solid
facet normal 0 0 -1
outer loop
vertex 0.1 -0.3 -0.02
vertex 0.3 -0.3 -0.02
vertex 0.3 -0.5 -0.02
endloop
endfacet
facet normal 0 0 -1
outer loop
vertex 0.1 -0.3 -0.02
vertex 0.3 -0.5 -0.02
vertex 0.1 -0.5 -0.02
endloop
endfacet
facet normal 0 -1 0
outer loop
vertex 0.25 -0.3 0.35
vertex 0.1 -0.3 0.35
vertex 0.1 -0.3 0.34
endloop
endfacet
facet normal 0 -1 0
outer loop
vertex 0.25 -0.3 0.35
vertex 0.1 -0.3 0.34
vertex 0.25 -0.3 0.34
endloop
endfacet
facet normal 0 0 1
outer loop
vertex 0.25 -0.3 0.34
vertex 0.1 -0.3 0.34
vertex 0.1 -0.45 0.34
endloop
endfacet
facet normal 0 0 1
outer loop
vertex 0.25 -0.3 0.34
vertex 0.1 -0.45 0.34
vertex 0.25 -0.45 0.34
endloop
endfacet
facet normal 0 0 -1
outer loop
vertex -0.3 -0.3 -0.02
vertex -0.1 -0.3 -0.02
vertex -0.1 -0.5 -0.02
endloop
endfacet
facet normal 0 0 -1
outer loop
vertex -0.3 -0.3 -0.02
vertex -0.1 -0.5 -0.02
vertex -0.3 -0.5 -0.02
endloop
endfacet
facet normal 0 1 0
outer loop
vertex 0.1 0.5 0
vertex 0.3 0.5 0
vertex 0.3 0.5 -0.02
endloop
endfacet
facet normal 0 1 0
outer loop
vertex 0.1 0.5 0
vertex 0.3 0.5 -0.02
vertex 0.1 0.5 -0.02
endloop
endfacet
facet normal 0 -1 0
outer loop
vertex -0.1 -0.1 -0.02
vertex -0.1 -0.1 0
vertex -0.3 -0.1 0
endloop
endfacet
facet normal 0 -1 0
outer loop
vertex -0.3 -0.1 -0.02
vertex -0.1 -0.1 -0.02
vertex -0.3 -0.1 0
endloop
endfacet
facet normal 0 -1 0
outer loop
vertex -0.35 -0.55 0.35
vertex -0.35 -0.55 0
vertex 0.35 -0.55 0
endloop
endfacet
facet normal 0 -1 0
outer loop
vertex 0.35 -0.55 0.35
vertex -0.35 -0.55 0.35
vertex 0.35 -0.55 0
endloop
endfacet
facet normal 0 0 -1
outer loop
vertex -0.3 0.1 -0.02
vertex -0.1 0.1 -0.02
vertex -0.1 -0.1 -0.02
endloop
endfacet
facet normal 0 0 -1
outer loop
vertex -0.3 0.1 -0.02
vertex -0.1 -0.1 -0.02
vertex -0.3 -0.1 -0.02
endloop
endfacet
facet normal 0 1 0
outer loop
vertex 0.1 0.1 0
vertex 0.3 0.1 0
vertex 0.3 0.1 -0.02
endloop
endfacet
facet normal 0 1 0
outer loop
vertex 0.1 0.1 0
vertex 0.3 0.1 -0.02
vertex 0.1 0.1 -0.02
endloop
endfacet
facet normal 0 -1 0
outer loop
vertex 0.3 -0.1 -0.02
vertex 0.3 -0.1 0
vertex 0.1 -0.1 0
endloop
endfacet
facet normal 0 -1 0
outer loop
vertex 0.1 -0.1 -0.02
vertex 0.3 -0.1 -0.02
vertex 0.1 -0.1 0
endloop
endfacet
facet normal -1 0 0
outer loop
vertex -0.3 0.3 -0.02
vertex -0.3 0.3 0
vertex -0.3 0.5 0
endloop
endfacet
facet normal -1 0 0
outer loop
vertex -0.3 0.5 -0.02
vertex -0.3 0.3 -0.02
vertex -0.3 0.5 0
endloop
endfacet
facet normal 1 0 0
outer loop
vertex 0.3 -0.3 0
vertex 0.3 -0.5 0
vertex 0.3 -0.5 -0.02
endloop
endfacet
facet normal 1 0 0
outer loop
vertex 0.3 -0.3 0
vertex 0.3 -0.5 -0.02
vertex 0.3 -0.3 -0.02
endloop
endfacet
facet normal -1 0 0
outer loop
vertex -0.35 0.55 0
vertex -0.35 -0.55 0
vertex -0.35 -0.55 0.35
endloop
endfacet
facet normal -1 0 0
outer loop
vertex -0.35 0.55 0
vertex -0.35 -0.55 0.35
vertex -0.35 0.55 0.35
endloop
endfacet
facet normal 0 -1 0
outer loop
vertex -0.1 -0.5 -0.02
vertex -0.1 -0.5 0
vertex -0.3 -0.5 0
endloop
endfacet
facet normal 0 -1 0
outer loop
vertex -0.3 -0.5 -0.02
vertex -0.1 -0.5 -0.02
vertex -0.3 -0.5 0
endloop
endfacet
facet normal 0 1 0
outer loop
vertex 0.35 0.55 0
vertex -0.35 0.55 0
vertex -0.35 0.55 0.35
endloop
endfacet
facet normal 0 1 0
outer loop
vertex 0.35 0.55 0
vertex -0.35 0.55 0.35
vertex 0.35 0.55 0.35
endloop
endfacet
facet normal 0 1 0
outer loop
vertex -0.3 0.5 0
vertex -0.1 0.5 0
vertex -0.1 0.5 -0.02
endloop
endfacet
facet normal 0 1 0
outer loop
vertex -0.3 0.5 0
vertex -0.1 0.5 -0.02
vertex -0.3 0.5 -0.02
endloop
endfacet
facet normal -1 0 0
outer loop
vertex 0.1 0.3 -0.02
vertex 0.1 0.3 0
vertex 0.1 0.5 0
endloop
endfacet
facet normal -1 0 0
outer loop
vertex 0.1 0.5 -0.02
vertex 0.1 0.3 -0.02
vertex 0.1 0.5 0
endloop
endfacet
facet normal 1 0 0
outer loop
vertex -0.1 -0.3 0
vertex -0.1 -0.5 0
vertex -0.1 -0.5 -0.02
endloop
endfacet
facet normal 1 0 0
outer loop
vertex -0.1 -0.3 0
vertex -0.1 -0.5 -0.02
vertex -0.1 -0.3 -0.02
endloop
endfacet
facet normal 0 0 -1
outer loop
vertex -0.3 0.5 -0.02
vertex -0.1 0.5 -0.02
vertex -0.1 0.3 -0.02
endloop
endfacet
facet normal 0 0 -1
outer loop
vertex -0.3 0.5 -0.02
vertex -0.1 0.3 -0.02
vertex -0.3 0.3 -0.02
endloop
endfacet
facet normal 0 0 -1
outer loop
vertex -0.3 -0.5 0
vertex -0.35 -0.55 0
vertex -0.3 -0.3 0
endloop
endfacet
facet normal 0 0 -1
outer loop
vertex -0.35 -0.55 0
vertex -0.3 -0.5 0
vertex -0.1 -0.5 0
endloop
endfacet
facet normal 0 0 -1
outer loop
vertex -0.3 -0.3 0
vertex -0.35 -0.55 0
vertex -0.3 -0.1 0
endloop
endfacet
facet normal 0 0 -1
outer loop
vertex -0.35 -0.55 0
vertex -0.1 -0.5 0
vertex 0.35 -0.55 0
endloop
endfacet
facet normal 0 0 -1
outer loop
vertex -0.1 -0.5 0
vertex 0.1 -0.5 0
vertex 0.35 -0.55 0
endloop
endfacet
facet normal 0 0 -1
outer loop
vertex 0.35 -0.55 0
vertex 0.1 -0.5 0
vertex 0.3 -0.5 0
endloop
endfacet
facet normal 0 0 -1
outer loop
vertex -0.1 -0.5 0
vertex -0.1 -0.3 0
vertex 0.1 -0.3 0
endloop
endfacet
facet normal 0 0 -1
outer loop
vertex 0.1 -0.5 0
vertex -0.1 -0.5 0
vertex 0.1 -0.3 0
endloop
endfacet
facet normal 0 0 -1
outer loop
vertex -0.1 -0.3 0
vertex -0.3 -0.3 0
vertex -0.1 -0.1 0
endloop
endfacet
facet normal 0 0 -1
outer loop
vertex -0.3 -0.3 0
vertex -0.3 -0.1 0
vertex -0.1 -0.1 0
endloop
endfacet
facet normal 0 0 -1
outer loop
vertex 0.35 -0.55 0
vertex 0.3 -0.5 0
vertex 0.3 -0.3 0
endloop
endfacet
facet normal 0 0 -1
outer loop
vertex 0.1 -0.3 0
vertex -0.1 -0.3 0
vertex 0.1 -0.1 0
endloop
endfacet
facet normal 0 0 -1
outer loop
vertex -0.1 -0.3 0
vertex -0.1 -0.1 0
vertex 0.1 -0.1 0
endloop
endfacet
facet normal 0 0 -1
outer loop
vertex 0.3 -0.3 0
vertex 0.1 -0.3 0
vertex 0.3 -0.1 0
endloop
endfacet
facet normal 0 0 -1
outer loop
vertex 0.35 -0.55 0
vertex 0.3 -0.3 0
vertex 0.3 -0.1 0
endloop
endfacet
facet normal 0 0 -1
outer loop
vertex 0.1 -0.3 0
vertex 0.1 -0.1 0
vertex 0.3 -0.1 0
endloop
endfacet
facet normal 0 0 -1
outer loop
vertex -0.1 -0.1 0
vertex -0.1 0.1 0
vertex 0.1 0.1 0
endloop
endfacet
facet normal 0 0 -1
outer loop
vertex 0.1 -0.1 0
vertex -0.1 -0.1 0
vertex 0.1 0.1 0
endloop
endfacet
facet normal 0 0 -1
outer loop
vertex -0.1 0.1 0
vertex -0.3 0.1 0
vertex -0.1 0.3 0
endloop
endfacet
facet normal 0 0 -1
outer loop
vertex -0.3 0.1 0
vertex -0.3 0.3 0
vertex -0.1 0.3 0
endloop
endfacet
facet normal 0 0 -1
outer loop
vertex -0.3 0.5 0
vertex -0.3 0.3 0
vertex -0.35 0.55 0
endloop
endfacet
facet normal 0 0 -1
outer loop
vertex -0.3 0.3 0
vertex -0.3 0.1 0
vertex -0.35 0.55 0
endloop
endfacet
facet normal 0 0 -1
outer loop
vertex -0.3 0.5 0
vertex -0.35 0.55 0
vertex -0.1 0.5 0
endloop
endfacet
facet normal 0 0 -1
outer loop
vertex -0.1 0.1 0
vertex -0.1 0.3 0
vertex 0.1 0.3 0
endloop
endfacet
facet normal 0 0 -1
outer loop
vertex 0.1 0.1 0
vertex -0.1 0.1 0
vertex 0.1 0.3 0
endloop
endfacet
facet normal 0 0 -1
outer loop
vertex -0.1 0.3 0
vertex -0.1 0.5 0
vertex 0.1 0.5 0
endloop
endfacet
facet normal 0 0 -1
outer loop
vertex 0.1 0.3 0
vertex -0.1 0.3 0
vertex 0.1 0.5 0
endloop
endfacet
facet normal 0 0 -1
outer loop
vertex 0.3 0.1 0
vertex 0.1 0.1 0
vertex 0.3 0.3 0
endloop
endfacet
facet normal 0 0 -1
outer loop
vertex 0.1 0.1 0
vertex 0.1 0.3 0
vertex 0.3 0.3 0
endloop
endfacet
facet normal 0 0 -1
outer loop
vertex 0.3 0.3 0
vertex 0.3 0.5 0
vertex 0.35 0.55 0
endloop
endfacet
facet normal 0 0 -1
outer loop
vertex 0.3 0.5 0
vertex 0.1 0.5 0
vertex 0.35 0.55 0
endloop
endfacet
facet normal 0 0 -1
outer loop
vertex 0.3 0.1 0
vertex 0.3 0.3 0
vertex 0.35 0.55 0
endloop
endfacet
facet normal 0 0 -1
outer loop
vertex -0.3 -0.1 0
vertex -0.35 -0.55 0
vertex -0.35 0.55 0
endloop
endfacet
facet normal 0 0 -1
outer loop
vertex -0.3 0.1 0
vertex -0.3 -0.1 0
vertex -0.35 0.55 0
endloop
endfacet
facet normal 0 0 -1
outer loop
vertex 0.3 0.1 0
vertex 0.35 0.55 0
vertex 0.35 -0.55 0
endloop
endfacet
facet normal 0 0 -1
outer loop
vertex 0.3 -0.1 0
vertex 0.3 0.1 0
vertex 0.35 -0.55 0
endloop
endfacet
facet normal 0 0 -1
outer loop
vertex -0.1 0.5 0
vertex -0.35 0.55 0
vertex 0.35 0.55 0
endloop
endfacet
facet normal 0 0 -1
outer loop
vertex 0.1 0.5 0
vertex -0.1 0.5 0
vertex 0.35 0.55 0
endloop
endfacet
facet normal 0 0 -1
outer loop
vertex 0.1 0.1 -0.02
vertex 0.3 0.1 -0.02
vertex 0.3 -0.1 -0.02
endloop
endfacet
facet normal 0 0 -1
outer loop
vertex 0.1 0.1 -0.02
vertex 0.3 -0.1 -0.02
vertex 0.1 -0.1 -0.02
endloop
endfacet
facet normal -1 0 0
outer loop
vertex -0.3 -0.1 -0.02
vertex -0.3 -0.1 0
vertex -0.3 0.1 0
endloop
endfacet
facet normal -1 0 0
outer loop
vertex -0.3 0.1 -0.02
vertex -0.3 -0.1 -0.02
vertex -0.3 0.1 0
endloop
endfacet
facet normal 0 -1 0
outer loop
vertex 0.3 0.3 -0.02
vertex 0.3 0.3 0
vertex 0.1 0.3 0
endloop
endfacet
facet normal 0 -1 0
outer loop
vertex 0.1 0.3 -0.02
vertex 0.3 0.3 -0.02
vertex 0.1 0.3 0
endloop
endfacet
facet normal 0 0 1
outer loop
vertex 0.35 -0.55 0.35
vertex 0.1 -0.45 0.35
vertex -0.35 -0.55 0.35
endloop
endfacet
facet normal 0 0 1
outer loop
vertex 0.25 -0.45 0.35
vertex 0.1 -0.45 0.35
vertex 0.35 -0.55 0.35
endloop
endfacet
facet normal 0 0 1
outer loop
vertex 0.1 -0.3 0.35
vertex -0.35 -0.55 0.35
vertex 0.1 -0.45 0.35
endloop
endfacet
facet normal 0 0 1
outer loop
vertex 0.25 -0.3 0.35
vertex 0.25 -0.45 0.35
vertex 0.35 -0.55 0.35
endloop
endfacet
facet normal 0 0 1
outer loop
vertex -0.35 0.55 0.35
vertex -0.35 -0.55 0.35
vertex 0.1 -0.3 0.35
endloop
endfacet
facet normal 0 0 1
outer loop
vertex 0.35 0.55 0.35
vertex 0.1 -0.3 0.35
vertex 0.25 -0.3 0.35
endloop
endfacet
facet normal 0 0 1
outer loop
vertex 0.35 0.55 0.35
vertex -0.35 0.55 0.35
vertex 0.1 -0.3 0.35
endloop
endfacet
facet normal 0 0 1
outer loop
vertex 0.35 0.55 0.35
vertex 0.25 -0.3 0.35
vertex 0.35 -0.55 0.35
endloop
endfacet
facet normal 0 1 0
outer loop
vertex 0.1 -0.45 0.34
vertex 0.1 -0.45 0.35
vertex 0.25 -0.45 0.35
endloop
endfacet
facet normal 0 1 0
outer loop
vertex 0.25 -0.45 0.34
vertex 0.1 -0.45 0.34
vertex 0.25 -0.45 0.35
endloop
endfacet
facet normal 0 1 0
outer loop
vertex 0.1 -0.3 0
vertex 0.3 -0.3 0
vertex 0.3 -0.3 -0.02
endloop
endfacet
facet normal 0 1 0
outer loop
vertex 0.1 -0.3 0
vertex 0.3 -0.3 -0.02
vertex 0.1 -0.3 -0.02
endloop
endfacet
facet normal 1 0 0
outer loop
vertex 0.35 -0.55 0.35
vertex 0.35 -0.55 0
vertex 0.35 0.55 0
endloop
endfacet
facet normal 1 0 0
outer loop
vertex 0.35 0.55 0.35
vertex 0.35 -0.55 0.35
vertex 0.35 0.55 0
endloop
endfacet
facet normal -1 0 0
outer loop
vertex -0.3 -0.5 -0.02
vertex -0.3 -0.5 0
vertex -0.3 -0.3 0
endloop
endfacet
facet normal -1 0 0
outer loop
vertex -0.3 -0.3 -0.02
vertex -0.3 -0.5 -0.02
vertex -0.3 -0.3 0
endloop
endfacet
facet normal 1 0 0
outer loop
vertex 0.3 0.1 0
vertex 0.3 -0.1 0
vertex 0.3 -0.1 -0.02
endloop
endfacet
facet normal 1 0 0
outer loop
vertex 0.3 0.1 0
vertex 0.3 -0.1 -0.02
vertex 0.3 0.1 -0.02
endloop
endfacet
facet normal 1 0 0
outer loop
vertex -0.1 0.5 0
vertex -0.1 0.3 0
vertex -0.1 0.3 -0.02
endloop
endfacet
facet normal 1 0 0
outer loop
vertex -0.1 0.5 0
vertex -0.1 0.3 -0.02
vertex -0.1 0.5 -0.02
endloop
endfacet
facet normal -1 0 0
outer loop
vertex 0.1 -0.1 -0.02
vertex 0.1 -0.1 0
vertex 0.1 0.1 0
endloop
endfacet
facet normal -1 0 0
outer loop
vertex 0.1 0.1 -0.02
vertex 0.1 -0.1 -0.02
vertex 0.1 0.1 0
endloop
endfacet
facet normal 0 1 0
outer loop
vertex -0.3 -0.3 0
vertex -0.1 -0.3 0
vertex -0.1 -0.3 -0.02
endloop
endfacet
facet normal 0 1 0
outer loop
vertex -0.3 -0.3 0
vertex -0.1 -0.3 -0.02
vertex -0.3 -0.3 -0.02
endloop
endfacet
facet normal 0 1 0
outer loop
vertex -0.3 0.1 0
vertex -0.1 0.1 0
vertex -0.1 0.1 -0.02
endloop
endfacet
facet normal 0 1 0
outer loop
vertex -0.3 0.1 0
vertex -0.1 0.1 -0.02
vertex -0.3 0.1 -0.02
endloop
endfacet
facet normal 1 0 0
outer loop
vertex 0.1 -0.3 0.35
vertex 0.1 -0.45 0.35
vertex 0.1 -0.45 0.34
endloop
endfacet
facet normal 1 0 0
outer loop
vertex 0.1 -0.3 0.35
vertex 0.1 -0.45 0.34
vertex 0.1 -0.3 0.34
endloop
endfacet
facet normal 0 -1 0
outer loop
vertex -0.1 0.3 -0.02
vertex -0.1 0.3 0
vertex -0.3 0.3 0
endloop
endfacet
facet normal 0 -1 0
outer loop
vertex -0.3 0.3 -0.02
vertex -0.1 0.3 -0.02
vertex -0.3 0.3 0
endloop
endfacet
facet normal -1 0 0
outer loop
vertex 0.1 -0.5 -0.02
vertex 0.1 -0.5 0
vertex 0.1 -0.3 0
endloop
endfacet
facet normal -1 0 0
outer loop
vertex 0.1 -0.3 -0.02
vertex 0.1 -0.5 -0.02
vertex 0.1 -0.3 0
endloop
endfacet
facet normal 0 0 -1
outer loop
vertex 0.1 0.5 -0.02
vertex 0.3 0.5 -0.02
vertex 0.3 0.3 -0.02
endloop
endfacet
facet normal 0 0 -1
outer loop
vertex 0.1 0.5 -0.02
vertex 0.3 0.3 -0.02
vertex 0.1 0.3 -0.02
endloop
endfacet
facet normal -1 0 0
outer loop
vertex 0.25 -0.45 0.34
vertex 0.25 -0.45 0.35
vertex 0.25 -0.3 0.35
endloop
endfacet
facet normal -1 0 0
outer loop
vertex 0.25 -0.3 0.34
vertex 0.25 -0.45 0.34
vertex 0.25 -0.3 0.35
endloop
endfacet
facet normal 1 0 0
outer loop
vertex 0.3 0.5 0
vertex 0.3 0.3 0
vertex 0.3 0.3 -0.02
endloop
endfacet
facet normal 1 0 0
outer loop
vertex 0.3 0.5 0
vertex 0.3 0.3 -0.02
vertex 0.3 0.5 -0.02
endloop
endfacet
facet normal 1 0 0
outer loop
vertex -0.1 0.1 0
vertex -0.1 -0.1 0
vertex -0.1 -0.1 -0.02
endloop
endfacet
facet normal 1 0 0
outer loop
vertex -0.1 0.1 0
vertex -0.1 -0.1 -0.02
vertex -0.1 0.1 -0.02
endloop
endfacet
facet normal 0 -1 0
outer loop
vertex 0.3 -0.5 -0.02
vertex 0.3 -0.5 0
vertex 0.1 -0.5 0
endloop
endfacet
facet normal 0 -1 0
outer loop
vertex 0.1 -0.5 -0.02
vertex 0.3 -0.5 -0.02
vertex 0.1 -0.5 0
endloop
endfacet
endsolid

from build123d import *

# Parameters (mm, degrees)
SKETCH1_W           = 0.7
SKETCH1_H           = 1.1
BOSS_EXTRUDE1_DEPTH = 0.35
SKETCH2_W           = 0.2
SKETCH2_H           = 0.2
BOSS_EXTRUDE2_DEPTH = 0.02
SKETCH3_W           = 0.15
SKETCH3_H           = 0.15
CUT_EXTRUDE1_DEPTH  = 0.01


with BuildPart() as part:
    # Sketch1 → Boss-Extrude1 (new body)
    with BuildSketch(Plane.XY):
        Rectangle(SKETCH1_W, SKETCH1_H)
    extrude(amount=BOSS_EXTRUDE1_DEPTH)

    # Sketch2 → Boss-Extrude2 (add)
    with BuildSketch(Plane(origin=(0, 0, 0), x_dir=(-1, 0, 0), z_dir=(0, 0, -1))):
        with Locations((-0.2, 0.4)):
            Rectangle(SKETCH2_W, SKETCH2_H)
        with Locations((-0.2, -0.4)):
            Rectangle(SKETCH2_W, SKETCH2_H)
        with Locations((-0.2, 0)):
            Rectangle(SKETCH2_W, SKETCH2_H)
        with Locations((0.2, -0.4)):
            Rectangle(SKETCH2_W, SKETCH2_H)
        with Locations((0.2, 0)):
            Rectangle(SKETCH2_W, SKETCH2_H)
        with Locations((0.2, 0.4)):
            Rectangle(SKETCH2_W, SKETCH2_H)
    extrude(amount=BOSS_EXTRUDE2_DEPTH)

    # Sketch3 → Cut-Extrude1 (cut)
    with BuildSketch(Plane.XY.offset(0.35)):
        with Locations((0.175, -0.375)):
            Rectangle(SKETCH3_W, SKETCH3_H)
    extrude(amount=-CUT_EXTRUDE1_DEPTH, mode=Mode.SUBTRACT)


solid = part.part
